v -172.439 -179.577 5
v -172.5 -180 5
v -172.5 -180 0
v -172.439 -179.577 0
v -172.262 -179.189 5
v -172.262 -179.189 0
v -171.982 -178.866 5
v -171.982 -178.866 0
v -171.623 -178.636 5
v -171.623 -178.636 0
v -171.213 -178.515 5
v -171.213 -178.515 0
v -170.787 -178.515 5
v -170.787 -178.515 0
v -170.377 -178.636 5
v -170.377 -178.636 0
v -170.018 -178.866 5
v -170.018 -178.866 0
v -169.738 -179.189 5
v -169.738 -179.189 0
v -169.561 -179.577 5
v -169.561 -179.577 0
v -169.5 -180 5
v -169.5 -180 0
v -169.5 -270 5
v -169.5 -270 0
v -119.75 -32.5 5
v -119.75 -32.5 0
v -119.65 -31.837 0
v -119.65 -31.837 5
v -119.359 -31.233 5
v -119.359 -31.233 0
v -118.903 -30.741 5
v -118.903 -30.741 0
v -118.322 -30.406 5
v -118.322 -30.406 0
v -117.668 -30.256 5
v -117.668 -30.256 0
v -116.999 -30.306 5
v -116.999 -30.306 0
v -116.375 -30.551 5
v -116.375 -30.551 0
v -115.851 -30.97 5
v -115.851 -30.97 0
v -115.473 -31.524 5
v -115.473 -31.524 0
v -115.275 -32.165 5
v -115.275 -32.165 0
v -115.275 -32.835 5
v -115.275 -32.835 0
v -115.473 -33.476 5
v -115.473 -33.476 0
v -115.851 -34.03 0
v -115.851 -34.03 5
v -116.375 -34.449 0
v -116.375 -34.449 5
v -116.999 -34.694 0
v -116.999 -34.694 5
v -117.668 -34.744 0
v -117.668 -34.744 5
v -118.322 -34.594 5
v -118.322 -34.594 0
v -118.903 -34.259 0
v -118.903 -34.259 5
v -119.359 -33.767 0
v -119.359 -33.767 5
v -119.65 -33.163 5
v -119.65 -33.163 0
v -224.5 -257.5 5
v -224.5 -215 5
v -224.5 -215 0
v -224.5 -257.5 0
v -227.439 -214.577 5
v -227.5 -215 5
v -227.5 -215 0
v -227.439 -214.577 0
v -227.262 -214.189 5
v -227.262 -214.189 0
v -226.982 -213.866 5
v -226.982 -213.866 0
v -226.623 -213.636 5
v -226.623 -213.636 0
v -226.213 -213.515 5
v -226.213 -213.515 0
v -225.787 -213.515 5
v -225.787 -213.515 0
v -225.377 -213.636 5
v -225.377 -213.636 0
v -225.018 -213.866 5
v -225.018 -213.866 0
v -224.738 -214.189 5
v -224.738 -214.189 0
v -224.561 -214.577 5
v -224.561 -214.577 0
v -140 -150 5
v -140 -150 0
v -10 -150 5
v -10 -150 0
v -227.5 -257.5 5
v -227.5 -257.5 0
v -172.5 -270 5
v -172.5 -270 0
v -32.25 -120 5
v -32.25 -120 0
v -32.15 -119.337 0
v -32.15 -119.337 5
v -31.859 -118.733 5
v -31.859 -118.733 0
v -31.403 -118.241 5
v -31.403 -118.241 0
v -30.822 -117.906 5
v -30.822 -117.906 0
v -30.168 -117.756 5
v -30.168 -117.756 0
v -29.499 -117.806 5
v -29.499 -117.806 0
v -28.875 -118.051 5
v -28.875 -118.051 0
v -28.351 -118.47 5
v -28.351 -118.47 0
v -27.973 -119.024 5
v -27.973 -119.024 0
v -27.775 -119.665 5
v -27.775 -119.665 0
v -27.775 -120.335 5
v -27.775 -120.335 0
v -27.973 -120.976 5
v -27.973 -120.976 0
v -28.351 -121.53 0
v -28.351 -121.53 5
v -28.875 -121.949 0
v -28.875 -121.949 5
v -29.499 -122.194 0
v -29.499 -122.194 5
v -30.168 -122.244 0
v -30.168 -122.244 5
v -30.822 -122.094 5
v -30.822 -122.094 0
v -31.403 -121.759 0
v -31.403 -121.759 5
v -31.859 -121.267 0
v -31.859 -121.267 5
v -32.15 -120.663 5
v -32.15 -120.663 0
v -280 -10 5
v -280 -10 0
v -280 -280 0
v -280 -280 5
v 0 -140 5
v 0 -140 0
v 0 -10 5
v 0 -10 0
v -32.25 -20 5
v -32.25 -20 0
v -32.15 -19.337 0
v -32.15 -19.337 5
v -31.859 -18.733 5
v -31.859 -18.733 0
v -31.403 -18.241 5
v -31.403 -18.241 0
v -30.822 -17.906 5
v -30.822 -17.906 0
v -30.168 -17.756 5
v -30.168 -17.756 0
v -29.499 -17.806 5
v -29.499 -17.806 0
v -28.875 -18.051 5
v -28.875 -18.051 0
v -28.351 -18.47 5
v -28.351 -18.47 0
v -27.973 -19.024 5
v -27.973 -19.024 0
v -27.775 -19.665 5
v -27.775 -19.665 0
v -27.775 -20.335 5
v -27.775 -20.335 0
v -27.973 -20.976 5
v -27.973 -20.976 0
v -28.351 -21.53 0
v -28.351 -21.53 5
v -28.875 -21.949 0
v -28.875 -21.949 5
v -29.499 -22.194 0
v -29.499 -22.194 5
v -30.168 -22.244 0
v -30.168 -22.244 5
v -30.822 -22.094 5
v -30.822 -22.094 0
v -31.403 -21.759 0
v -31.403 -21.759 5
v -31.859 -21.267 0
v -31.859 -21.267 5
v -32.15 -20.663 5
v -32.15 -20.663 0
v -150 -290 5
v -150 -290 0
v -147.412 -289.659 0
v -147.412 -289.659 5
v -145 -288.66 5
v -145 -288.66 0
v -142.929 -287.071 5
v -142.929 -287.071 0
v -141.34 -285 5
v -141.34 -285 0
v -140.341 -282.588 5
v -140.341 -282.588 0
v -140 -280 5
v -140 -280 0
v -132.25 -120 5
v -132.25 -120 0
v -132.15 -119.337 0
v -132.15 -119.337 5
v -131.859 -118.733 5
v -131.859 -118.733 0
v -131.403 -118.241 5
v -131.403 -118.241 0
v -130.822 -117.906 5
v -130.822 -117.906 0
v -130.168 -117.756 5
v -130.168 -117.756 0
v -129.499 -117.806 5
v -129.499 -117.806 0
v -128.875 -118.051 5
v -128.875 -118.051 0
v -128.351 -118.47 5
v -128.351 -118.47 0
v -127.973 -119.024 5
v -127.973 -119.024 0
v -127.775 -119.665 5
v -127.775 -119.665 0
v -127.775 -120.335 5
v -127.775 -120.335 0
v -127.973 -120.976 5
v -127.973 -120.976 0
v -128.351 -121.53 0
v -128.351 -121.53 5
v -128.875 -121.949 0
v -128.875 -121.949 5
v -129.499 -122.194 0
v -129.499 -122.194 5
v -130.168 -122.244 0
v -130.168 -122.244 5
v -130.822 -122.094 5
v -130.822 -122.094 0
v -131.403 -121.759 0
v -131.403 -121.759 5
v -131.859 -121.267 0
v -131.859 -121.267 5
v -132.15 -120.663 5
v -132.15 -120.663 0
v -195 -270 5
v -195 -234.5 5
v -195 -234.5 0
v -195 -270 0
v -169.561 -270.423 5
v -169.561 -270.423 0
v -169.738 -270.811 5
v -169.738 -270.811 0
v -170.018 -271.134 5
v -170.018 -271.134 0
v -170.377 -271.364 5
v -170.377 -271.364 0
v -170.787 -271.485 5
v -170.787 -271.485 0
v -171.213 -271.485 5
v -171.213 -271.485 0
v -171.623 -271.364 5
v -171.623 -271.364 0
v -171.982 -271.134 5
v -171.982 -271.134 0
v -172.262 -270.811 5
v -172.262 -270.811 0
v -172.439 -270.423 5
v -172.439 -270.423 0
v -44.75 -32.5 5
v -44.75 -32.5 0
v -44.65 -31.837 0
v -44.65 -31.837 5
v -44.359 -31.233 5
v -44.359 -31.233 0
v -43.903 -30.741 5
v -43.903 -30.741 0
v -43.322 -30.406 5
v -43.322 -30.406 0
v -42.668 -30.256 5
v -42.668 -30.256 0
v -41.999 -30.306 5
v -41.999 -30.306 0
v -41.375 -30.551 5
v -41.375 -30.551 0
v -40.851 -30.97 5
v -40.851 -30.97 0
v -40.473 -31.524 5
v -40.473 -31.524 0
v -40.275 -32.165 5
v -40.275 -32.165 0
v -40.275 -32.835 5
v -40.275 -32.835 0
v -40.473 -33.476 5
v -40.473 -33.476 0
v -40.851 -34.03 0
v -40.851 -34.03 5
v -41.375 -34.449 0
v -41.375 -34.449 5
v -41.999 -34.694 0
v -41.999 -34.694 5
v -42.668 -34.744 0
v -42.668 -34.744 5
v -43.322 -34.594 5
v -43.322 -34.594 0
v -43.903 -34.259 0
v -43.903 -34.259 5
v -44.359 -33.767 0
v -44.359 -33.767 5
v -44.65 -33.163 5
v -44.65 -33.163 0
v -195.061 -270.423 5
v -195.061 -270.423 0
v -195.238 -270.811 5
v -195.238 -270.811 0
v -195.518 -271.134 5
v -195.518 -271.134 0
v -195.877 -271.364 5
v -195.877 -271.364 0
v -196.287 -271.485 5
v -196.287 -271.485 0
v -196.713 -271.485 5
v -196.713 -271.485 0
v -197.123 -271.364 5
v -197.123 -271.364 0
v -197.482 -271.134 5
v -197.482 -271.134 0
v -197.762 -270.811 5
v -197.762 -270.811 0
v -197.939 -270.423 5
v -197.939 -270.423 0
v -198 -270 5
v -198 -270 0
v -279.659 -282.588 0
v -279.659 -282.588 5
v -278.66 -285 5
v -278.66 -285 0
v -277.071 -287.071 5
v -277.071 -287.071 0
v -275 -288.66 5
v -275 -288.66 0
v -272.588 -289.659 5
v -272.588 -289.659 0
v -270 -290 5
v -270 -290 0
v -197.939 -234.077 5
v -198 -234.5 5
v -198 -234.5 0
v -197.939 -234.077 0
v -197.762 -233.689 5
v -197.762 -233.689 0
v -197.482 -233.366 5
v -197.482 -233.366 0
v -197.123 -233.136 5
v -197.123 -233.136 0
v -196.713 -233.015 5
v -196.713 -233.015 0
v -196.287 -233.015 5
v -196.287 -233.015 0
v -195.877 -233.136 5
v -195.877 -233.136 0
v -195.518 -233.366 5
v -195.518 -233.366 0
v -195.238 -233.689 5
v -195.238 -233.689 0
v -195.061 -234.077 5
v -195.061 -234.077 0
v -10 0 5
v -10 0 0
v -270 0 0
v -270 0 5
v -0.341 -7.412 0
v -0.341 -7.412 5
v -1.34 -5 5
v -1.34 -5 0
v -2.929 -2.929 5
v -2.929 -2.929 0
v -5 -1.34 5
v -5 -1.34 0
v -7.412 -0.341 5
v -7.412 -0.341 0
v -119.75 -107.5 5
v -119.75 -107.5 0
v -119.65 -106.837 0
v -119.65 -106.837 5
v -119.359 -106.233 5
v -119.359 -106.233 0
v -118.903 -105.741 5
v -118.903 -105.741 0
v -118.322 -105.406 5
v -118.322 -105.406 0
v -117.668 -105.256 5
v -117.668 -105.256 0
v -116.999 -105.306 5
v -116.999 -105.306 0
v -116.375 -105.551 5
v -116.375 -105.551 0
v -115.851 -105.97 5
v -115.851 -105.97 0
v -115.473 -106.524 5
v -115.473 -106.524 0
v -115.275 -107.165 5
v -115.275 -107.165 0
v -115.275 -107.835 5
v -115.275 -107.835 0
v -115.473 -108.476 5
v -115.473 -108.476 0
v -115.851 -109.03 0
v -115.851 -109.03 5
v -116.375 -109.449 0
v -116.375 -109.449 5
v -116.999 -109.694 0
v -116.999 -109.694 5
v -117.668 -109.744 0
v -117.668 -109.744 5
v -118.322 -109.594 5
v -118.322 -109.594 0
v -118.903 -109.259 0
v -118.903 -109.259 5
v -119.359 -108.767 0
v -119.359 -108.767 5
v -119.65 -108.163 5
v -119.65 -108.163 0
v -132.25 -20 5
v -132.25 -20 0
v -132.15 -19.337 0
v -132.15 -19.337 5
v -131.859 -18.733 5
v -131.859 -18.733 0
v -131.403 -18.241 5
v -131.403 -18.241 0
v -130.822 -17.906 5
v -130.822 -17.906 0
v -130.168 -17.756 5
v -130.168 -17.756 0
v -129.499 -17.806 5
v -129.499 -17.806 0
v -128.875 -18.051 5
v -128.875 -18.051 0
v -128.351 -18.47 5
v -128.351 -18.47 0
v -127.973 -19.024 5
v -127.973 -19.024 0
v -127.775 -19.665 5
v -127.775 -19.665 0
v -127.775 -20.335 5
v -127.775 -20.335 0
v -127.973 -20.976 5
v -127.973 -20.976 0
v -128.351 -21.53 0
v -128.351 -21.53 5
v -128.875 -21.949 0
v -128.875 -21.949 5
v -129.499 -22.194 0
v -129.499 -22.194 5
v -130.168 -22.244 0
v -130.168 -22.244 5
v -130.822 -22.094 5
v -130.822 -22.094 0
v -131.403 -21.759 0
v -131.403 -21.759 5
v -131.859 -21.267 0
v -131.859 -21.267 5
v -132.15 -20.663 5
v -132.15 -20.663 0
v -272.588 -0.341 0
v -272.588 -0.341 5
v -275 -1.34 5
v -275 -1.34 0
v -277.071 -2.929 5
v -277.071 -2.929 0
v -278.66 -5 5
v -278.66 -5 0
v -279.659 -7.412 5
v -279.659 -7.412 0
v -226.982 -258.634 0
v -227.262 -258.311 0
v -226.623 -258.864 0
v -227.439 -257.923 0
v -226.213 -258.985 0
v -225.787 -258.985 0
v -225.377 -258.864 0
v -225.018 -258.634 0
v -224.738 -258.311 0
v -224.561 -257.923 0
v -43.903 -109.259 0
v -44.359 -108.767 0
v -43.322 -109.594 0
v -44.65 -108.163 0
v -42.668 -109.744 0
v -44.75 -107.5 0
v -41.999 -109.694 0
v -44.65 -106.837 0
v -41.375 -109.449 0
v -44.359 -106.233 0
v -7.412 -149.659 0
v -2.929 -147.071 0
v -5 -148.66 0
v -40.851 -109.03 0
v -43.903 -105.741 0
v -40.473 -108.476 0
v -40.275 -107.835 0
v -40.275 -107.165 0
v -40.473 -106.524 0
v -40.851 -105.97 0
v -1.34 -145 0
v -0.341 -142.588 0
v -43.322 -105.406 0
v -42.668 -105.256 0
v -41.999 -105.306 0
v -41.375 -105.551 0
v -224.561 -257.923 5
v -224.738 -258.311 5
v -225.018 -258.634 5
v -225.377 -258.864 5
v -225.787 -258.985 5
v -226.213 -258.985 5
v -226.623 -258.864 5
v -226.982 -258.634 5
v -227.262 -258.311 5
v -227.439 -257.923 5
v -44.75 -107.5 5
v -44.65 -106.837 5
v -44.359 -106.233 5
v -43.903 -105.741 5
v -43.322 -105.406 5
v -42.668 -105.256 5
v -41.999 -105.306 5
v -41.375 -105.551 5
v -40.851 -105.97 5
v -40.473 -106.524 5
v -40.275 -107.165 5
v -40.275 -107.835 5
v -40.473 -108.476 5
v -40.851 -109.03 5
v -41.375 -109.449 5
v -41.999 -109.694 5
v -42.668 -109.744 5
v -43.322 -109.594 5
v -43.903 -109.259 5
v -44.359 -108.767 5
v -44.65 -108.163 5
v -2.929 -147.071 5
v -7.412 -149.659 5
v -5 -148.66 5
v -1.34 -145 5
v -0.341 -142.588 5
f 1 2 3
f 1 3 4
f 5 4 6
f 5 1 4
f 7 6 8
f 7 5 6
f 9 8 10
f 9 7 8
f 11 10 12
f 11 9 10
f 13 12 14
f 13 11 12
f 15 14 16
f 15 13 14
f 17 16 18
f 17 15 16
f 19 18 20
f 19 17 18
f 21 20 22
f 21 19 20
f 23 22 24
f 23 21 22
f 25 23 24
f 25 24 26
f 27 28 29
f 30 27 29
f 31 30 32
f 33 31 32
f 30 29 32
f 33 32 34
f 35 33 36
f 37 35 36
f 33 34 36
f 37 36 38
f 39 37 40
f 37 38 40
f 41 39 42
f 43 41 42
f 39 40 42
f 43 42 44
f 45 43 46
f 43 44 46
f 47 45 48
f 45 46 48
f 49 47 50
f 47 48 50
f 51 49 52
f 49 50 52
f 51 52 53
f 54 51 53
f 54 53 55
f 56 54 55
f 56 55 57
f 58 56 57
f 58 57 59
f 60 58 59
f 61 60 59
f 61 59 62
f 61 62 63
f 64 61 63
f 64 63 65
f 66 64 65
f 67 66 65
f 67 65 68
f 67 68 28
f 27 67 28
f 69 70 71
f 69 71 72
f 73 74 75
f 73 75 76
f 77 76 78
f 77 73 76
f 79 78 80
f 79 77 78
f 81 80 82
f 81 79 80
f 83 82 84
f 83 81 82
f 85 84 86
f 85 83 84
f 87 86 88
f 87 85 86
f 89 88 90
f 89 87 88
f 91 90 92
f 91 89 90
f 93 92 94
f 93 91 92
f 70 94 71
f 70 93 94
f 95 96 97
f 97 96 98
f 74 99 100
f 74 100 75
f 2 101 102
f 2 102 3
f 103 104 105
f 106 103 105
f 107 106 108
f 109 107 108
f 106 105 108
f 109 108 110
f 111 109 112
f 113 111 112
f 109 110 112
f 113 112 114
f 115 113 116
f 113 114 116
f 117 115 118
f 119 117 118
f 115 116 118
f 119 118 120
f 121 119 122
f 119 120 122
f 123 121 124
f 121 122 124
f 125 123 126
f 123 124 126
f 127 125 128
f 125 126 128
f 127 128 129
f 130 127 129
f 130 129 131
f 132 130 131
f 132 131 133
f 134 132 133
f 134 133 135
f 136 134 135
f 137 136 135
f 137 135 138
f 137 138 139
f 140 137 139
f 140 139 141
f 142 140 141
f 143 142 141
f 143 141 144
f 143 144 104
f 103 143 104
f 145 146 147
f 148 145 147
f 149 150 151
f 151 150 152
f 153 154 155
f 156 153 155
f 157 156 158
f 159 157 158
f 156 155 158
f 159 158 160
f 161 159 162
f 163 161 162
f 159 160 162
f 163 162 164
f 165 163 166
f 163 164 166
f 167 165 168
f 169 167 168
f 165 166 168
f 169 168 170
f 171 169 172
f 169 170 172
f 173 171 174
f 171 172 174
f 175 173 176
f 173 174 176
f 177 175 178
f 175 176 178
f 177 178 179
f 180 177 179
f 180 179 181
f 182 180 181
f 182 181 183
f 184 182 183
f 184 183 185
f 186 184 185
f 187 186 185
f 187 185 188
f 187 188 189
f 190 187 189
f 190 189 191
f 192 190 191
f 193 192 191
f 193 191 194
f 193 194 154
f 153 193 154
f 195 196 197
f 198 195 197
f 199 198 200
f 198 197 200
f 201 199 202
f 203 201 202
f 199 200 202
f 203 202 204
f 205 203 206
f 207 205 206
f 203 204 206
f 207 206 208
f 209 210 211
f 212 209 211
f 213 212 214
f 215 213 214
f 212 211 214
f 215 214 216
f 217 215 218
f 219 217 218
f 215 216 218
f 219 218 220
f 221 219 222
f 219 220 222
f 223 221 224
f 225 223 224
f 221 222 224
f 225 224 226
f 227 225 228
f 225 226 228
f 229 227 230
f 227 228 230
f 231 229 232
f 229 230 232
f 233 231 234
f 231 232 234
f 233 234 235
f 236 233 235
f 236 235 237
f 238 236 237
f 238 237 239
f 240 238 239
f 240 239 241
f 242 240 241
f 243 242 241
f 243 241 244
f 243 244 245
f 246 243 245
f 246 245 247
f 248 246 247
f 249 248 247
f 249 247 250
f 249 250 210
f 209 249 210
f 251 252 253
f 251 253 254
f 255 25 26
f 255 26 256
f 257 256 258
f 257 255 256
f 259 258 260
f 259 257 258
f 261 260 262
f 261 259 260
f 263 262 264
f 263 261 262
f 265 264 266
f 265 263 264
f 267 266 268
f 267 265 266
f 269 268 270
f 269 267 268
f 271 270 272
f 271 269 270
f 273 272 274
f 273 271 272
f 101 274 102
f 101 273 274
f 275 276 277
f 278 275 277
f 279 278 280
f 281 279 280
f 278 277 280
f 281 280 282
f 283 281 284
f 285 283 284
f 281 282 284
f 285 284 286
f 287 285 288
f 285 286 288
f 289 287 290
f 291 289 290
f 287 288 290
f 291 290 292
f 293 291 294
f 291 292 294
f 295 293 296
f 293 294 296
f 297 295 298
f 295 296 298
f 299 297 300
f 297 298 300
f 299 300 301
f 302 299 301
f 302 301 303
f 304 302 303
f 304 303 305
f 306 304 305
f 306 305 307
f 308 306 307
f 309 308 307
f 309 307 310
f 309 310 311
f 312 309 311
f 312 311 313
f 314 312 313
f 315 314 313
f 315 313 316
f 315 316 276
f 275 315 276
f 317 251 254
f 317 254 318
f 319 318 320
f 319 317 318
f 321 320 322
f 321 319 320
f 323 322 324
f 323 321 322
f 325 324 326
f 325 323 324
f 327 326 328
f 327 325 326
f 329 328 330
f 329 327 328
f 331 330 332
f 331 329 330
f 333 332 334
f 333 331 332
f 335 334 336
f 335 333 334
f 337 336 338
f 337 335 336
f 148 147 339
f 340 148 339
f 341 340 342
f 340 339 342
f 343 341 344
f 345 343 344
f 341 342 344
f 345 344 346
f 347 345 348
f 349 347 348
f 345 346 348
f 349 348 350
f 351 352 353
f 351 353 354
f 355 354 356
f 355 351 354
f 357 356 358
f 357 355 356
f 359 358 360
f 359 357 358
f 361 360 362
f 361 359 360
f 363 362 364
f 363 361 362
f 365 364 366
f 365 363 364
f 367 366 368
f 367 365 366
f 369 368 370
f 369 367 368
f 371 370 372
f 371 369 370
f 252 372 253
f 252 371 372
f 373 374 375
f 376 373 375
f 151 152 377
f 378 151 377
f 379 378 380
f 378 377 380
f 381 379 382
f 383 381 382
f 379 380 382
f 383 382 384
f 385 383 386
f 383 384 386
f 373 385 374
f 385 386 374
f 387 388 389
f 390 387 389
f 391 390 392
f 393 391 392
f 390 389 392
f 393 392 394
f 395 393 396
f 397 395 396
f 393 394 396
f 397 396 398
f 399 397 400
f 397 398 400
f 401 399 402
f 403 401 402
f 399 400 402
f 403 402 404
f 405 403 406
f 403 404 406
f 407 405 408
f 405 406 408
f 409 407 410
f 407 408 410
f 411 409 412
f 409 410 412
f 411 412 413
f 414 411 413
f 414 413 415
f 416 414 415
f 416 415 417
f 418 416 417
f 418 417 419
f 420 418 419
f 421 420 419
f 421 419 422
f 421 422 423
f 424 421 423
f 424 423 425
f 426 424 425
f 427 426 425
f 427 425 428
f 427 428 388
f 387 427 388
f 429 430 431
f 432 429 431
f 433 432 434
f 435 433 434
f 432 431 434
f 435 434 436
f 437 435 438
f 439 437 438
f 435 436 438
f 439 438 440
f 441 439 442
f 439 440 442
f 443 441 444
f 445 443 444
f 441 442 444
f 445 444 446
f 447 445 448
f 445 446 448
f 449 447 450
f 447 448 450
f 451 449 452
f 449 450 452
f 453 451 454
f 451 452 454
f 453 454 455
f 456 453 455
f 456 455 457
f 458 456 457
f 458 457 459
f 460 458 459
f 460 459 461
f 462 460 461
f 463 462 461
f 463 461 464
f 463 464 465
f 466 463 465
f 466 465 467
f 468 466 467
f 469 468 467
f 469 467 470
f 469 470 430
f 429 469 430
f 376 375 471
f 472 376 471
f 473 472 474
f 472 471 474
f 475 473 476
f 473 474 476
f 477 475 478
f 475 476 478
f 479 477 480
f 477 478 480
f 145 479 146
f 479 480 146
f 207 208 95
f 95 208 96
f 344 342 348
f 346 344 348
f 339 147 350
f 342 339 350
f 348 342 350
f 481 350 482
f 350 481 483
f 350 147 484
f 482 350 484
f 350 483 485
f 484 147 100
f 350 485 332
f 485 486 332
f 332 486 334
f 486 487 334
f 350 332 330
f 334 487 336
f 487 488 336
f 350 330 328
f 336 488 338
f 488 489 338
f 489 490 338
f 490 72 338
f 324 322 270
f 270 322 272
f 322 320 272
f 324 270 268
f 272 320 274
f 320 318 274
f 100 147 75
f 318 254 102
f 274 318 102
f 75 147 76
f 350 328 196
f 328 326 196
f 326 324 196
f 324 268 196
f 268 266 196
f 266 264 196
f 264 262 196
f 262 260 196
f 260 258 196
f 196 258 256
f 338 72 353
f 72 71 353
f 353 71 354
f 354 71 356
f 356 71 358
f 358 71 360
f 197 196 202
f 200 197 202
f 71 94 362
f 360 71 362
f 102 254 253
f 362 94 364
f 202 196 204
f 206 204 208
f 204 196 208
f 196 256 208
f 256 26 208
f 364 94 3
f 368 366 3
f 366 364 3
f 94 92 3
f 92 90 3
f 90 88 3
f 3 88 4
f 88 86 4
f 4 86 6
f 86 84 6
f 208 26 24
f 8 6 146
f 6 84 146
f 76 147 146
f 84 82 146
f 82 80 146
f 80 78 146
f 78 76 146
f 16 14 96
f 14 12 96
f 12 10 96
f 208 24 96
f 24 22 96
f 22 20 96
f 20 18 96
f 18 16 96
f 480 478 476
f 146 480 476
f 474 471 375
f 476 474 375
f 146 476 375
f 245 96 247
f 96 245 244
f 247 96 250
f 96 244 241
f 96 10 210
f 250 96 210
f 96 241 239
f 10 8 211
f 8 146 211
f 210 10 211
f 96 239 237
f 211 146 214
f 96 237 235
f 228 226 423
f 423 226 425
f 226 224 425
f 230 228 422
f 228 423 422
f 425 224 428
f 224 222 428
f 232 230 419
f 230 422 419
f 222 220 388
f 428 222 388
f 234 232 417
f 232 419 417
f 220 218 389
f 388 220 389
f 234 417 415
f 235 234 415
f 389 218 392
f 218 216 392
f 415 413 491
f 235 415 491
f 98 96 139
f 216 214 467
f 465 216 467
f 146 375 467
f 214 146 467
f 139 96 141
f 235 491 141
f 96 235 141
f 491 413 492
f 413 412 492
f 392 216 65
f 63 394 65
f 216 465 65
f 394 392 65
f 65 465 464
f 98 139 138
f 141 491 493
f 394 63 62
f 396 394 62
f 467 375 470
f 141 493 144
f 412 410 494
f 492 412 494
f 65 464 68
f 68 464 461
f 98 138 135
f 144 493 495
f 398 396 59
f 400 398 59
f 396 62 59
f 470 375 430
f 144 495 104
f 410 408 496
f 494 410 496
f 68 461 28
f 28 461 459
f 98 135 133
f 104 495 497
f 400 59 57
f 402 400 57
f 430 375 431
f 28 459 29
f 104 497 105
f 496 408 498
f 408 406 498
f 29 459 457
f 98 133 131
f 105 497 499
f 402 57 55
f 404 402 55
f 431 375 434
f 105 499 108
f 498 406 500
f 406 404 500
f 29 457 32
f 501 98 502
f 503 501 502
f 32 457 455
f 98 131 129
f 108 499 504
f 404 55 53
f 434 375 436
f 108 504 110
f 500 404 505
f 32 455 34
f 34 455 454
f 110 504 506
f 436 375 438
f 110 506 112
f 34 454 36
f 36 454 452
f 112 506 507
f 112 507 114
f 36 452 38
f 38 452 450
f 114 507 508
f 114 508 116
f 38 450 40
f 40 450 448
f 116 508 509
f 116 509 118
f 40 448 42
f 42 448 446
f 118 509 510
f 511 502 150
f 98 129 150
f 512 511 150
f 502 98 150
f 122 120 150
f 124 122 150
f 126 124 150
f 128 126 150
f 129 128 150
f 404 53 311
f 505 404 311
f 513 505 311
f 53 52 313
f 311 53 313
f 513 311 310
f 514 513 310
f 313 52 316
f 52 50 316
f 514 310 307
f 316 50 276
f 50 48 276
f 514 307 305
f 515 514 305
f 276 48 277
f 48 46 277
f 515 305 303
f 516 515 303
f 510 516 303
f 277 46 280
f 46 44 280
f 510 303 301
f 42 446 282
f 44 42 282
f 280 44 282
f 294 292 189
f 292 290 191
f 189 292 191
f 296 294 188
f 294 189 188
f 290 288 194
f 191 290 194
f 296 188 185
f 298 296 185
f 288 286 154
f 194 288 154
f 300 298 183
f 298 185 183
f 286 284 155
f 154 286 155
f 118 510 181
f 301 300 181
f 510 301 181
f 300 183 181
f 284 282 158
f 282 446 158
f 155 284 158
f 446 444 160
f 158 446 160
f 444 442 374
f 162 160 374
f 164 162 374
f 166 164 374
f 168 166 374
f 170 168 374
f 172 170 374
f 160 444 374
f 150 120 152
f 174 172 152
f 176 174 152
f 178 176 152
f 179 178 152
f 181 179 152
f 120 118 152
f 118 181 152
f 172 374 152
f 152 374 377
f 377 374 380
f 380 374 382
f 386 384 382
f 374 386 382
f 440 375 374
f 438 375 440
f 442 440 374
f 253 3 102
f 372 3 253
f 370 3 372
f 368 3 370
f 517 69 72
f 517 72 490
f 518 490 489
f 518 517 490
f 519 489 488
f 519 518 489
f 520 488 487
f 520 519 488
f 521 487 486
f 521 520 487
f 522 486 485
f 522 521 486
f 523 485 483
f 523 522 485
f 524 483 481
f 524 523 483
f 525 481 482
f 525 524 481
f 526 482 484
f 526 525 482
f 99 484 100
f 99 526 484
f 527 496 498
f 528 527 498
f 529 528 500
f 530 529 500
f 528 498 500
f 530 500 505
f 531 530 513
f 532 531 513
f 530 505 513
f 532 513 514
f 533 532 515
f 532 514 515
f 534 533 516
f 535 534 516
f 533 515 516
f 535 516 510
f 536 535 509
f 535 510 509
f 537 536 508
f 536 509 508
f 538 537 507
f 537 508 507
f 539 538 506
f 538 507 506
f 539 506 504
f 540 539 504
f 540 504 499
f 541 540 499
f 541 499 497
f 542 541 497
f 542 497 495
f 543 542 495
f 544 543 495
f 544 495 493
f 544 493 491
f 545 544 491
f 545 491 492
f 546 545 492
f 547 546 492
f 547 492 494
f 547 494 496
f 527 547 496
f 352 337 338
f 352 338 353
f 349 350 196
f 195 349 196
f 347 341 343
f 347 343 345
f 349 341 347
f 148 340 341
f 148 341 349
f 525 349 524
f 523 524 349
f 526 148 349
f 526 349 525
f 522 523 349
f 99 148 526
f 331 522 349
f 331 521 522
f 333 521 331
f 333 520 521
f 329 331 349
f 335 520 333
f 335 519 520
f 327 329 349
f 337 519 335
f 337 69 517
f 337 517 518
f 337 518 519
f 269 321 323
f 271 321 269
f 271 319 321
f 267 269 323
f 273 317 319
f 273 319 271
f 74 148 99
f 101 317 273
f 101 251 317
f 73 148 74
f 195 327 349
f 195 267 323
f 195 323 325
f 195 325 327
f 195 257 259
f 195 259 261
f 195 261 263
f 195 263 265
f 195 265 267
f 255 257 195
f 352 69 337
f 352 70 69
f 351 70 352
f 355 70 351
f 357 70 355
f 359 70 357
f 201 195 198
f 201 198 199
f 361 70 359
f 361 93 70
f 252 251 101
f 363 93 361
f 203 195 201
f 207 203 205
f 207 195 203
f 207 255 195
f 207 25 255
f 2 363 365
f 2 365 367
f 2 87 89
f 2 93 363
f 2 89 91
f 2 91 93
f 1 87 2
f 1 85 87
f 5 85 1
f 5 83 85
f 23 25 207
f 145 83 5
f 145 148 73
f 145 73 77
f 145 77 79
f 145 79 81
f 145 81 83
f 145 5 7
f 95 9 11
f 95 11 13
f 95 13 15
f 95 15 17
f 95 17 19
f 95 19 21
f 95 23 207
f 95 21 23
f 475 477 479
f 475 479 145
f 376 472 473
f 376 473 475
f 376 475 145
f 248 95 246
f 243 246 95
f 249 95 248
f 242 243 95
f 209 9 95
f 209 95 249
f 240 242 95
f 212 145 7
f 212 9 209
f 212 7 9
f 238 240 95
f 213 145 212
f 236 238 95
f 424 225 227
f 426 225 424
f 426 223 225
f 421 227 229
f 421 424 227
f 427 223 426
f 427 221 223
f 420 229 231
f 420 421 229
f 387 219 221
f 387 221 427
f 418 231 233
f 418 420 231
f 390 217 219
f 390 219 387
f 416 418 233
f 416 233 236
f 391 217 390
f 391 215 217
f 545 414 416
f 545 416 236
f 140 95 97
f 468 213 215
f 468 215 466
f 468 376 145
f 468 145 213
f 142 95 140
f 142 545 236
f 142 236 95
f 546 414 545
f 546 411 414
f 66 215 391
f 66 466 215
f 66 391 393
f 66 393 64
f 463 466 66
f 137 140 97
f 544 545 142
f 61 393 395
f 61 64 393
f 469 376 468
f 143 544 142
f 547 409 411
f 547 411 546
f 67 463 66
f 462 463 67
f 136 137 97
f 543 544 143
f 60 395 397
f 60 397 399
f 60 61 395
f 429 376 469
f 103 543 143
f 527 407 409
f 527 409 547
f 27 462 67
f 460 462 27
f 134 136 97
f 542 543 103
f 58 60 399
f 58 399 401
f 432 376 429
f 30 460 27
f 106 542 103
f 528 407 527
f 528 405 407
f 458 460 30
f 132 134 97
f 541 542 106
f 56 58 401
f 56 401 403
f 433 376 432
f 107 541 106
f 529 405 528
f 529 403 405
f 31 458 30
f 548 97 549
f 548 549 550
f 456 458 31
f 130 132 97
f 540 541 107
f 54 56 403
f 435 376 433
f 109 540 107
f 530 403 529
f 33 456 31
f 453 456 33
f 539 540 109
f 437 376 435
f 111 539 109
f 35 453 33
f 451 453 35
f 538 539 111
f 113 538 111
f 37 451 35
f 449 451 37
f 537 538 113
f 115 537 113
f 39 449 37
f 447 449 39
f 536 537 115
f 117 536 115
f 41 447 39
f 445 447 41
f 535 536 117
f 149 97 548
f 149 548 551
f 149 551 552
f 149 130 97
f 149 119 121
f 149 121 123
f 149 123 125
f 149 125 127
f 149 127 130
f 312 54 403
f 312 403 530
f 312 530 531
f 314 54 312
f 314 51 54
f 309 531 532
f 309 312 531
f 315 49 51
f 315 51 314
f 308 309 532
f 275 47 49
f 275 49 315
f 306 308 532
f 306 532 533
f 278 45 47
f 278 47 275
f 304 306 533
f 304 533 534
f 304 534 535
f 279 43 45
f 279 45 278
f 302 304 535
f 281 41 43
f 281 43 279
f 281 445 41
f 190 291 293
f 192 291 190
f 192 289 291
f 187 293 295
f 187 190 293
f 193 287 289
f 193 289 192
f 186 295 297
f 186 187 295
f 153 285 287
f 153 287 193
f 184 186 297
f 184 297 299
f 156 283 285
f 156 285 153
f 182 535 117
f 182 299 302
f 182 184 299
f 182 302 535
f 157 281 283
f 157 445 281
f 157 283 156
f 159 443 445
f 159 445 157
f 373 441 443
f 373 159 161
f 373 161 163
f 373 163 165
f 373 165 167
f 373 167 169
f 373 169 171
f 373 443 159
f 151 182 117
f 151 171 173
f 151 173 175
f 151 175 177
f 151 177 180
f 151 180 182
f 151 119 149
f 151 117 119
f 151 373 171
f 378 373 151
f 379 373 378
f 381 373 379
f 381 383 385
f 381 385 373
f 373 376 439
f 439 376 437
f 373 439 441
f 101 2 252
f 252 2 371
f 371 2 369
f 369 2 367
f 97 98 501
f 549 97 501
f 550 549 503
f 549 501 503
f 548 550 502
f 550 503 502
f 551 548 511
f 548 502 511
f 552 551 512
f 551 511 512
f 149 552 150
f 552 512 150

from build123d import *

# Parameters (mm, degrees)
BOSS_EXTRUDE1_DEPTH      = 5
M4_CLEARANCE_HOLE1_D     = 4.5
M4_CLEARANCE_HOLE1_DEPTH = 10
M4_CLEARANCE_HOLE1_TIP   = 1.351936393
CUT_EXTRUDE1_DEPTH       = 404.143894906


with BuildPart() as part:
    # Sketch1 → Boss-Extrude1 (new body)
    with BuildSketch(Plane.XY):
        with BuildLine():
            Line((-10, 0), (-270, 0))
            ThreePointArc((-270, 0), (-277.071067812, -2.928932188), (-280, -10))
            Line((-280, -10), (-280, -280))
            ThreePointArc((-280, -280), (-277.071067812, -287.071067812), (-270, -290))
            Line((-270, -290), (-150, -290))
            ThreePointArc((-150, -290), (-142.928932188, -287.071067812), (-140, -280))
            Line((-140, -280), (-140, -150))
            Line((-140, -150), (-10, -150))
            ThreePointArc((-10, -150), (-2.928932188, -147.071067812), (0, -140))
            Line((0, -140), (0, -10))
            ThreePointArc((0, -10), (-2.928932188, -2.928932188), (-10, 0))
        make_face()
    extrude(amount=BOSS_EXTRUDE1_DEPTH)

    # M4 Clearance Hole1
    with Locations(Plane.XY.offset(5)):
        with Locations((-130, -120), (-30, -120), (-30, -20), (-130, -20), (-117.5, -107.5), (-42.5, -107.5), (-42.5, -32.5), (-117.5, -32.5)):
            Hole(M4_CLEARANCE_HOLE1_D / 2, depth=M4_CLEARANCE_HOLE1_DEPTH)
            with Locations((0, 0, -(M4_CLEARANCE_HOLE1_DEPTH + M4_CLEARANCE_HOLE1_TIP / 2))):  # 118° drill point
                Cone(0, M4_CLEARANCE_HOLE1_D / 2, M4_CLEARANCE_HOLE1_TIP, mode=Mode.SUBTRACT)

    # Sketch4 → Cut-Extrude1 (cut, through all)
    with BuildSketch(Plane.XY.offset(5)):
        with BuildLine():
            Line((-172.5, -270), (-172.5, -180))
            ThreePointArc((-172.5, -180), (-171, -178.5), (-169.5, -180))
            Line((-169.5, -180), (-169.5, -270))
            ThreePointArc((-169.5, -270), (-171, -271.5), (-172.5, -270))
        make_face()
        with BuildLine():
            Line((-198, -270), (-198, -234.5))
            ThreePointArc((-198, -234.5), (-196.5, -233), (-195, -234.5))
            Line((-195, -234.5), (-195, -270))
            ThreePointArc((-195, -270), (-196.5, -271.5), (-198, -270))
        make_face()
        with BuildLine():
            Line((-227.5, -257.5), (-227.5, -215))
            ThreePointArc((-227.5, -215), (-226, -213.5), (-224.5, -215))
            Line((-224.5, -215), (-224.5, -257.5))
            ThreePointArc((-224.5, -257.5), (-226, -259), (-227.5, -257.5))
        make_face()
    extrude(amount=-CUT_EXTRUDE1_DEPTH, mode=Mode.SUBTRACT)


solid = part.part
